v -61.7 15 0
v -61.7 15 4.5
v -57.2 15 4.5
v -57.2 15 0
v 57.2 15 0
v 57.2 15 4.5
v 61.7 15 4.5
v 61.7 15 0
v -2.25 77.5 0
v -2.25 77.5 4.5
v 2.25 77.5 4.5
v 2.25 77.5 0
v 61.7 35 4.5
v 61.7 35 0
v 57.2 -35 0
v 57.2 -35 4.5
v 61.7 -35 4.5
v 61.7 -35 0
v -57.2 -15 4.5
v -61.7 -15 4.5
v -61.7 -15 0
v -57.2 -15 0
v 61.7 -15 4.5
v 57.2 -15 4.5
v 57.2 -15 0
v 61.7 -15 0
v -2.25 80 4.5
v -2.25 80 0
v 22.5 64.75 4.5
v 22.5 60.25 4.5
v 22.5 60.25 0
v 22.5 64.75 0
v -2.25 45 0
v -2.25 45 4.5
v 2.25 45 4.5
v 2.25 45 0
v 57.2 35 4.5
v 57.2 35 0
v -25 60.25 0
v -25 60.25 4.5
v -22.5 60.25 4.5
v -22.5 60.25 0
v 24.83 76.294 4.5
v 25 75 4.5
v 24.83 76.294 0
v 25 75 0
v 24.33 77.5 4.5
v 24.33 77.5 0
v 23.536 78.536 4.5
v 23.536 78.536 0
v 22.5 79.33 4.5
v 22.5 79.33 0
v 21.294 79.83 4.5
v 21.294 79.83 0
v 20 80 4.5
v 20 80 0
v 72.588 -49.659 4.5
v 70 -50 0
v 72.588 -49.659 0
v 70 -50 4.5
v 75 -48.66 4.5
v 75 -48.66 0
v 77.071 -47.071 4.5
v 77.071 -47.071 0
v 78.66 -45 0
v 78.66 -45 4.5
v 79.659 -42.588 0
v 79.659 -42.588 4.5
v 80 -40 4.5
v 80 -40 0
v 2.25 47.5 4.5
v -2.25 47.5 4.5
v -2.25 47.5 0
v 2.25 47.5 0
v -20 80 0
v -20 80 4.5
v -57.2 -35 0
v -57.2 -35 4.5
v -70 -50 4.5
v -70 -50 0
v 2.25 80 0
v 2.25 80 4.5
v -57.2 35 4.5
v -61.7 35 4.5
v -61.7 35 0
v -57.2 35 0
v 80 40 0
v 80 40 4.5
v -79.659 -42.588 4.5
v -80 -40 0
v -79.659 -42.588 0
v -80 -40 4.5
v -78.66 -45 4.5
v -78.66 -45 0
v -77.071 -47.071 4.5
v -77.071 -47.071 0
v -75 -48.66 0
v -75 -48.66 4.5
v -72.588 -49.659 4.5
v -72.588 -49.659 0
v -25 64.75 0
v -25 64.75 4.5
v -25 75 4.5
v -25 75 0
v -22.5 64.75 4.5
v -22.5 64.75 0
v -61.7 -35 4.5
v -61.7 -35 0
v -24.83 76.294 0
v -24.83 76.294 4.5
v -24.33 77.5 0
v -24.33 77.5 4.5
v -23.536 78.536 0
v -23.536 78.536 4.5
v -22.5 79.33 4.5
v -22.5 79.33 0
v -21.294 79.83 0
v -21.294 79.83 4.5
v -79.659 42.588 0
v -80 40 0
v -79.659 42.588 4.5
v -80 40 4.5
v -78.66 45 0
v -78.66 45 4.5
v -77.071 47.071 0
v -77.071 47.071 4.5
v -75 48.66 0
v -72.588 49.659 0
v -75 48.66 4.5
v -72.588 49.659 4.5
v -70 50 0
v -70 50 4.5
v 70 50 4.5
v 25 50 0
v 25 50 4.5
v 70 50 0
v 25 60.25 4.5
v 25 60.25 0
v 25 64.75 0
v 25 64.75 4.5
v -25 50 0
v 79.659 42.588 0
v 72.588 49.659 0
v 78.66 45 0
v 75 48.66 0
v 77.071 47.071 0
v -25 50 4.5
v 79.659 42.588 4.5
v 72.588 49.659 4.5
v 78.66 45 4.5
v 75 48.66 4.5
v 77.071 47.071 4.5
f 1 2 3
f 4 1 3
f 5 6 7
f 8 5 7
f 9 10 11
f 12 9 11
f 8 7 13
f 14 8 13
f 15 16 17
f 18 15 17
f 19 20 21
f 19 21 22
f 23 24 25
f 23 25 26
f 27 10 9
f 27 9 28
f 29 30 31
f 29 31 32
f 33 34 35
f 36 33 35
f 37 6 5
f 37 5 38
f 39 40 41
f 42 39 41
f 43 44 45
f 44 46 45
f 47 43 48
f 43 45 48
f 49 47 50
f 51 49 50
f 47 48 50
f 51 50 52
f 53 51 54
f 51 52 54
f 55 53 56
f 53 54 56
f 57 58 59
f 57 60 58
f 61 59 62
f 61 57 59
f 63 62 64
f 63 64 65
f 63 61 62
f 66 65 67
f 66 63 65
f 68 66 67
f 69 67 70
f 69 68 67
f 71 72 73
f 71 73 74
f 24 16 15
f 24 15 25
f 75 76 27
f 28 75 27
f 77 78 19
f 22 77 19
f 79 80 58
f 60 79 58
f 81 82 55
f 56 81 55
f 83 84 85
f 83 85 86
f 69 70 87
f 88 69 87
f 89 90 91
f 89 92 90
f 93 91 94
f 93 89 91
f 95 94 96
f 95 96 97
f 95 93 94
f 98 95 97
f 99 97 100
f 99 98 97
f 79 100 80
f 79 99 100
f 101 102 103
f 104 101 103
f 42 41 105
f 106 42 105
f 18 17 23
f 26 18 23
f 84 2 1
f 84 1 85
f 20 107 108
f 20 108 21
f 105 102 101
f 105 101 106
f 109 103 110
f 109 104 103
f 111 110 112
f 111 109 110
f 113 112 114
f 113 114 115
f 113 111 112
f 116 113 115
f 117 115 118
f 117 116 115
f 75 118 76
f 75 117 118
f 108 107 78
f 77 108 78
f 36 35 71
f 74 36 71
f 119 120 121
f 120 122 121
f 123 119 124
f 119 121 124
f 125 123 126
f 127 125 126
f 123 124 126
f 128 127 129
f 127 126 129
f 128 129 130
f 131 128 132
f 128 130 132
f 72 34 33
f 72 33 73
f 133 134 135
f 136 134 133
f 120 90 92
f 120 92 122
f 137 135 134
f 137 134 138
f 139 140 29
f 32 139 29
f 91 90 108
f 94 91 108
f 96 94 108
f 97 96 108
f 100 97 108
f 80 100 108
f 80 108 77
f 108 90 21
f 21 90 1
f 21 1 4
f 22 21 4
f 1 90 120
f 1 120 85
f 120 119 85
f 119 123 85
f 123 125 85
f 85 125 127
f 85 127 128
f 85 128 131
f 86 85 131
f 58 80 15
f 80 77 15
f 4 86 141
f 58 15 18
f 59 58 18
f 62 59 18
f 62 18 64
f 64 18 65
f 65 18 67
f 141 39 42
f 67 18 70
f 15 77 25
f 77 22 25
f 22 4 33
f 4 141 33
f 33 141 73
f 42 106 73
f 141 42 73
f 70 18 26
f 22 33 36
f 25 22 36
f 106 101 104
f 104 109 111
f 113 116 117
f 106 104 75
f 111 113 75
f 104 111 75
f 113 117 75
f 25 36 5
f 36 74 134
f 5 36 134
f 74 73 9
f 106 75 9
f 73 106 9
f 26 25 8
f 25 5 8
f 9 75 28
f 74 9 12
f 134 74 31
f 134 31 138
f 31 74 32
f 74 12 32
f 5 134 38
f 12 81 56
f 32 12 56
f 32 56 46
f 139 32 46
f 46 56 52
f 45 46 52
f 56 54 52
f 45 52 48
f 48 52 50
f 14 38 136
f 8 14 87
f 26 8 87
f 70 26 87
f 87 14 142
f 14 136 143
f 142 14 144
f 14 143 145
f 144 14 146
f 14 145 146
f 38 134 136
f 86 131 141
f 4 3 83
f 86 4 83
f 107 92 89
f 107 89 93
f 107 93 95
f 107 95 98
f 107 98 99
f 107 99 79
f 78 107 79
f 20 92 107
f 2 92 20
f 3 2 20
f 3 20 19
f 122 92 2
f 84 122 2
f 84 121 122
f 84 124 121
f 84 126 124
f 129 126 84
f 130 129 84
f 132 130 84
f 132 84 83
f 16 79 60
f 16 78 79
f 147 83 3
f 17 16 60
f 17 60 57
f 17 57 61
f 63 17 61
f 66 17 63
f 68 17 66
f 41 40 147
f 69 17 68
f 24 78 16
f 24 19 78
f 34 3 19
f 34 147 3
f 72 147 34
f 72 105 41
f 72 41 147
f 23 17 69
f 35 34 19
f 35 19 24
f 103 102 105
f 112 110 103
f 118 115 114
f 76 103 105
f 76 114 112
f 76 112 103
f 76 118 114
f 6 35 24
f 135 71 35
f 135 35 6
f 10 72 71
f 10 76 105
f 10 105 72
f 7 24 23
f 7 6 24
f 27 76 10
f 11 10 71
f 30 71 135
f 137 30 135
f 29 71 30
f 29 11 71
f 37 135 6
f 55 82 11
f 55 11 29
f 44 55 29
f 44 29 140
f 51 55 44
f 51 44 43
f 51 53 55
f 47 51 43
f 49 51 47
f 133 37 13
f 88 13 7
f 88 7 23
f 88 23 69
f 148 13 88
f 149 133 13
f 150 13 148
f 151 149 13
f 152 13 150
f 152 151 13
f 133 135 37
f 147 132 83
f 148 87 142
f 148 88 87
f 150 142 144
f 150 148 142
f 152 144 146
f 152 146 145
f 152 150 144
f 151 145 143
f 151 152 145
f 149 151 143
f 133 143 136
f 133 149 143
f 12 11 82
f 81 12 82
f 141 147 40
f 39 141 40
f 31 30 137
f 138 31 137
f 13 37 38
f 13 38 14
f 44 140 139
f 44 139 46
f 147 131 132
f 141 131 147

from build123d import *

# Parameters (mm, degrees)
SKETCH1_W           = 160
SKETCH1_H           = 100
BOSS_EXTRUDE1_DEPTH = 4.5
FILLET1_R           = 10
SKETCH2_W           = 4.5
SKETCH2_H           = 20
CUT_EXTRUDE1_DEPTH  = 5
SKETCH3_W           = 50
SKETCH3_H           = 30
BOSS_EXTRUDE2_DEPTH = 4.5
FILLET2_R           = 5
SKETCH4_W           = 4.5
SKETCH4_H           = 2.5
SKETCH4_W_2         = 2.5
SKETCH4_H_2         = 4.5
CUT_EXTRUDE2_DEPTH  = 4.5


with BuildPart() as part:
    # Sketch1 → Boss-Extrude1 (new body)
    with BuildSketch(Plane.XY):
        Rectangle(SKETCH1_W, SKETCH1_H)
    extrude(amount=BOSS_EXTRUDE1_DEPTH)

    # Fillet1
    fillet1_edges = [part.edges().sort_by_distance(p)[0] for p in [
        (80, -50, 2.25),
        (-80, -50, 2.25),
        (-80, 50, 2.25),
        (80, 50, 2.25),
    ]]
    fillet(fillet1_edges, radius=FILLET1_R)

    # Sketch2 → Cut-Extrude1 (cut)
    with BuildSketch(Plane.XY.offset(4.5)):
        with Locations((-59.45, 25)):
            Rectangle(SKETCH2_W, SKETCH2_H)
        with Locations((-59.45, -25)):
            Rectangle(SKETCH2_W, SKETCH2_H)
        with Locations((59.45, -25)):
            Rectangle(SKETCH2_W, SKETCH2_H)
        with Locations((59.45, 25)):
            Rectangle(SKETCH2_W, SKETCH2_H)
    extrude(amount=-CUT_EXTRUDE1_DEPTH, mode=Mode.SUBTRACT)

    # Sketch3 → Boss-Extrude2 (add)
    with BuildSketch(Plane.XY.offset(4.5)):
        with Locations((0, 65)):
            Rectangle(SKETCH3_W, SKETCH3_H)
    extrude(amount=-BOSS_EXTRUDE2_DEPTH)

    # Fillet2
    fillet2_edges = [part.edges().sort_by_distance(p)[0] for p in [
        (-25, 80, 2.25),
        (25, 80, 2.25),
    ]]
    fillet(fillet2_edges, radius=FILLET2_R)

    # Sketch4 → Cut-Extrude2 (cut)
    with BuildSketch(Plane.XY.offset(4.5)):
        with Locations((0, 78.75)):
            Rectangle(SKETCH4_W, SKETCH4_H)
        with Locations((26.25, 62.5)):
            Rectangle(SKETCH4_W_2, SKETCH4_H_2)
        with Locations((23.75, 62.5)):
            Rectangle(SKETCH4_W_2, SKETCH4_H_2)
        with Locations((-23.75, 62.5)):
            Rectangle(SKETCH4_W_2, SKETCH4_H_2)
        with Locations((0, 46.25)):
            Rectangle(SKETCH4_W, SKETCH4_H)
    extrude(amount=-CUT_EXTRUDE2_DEPTH, mode=Mode.SUBTRACT)


solid = part.part
